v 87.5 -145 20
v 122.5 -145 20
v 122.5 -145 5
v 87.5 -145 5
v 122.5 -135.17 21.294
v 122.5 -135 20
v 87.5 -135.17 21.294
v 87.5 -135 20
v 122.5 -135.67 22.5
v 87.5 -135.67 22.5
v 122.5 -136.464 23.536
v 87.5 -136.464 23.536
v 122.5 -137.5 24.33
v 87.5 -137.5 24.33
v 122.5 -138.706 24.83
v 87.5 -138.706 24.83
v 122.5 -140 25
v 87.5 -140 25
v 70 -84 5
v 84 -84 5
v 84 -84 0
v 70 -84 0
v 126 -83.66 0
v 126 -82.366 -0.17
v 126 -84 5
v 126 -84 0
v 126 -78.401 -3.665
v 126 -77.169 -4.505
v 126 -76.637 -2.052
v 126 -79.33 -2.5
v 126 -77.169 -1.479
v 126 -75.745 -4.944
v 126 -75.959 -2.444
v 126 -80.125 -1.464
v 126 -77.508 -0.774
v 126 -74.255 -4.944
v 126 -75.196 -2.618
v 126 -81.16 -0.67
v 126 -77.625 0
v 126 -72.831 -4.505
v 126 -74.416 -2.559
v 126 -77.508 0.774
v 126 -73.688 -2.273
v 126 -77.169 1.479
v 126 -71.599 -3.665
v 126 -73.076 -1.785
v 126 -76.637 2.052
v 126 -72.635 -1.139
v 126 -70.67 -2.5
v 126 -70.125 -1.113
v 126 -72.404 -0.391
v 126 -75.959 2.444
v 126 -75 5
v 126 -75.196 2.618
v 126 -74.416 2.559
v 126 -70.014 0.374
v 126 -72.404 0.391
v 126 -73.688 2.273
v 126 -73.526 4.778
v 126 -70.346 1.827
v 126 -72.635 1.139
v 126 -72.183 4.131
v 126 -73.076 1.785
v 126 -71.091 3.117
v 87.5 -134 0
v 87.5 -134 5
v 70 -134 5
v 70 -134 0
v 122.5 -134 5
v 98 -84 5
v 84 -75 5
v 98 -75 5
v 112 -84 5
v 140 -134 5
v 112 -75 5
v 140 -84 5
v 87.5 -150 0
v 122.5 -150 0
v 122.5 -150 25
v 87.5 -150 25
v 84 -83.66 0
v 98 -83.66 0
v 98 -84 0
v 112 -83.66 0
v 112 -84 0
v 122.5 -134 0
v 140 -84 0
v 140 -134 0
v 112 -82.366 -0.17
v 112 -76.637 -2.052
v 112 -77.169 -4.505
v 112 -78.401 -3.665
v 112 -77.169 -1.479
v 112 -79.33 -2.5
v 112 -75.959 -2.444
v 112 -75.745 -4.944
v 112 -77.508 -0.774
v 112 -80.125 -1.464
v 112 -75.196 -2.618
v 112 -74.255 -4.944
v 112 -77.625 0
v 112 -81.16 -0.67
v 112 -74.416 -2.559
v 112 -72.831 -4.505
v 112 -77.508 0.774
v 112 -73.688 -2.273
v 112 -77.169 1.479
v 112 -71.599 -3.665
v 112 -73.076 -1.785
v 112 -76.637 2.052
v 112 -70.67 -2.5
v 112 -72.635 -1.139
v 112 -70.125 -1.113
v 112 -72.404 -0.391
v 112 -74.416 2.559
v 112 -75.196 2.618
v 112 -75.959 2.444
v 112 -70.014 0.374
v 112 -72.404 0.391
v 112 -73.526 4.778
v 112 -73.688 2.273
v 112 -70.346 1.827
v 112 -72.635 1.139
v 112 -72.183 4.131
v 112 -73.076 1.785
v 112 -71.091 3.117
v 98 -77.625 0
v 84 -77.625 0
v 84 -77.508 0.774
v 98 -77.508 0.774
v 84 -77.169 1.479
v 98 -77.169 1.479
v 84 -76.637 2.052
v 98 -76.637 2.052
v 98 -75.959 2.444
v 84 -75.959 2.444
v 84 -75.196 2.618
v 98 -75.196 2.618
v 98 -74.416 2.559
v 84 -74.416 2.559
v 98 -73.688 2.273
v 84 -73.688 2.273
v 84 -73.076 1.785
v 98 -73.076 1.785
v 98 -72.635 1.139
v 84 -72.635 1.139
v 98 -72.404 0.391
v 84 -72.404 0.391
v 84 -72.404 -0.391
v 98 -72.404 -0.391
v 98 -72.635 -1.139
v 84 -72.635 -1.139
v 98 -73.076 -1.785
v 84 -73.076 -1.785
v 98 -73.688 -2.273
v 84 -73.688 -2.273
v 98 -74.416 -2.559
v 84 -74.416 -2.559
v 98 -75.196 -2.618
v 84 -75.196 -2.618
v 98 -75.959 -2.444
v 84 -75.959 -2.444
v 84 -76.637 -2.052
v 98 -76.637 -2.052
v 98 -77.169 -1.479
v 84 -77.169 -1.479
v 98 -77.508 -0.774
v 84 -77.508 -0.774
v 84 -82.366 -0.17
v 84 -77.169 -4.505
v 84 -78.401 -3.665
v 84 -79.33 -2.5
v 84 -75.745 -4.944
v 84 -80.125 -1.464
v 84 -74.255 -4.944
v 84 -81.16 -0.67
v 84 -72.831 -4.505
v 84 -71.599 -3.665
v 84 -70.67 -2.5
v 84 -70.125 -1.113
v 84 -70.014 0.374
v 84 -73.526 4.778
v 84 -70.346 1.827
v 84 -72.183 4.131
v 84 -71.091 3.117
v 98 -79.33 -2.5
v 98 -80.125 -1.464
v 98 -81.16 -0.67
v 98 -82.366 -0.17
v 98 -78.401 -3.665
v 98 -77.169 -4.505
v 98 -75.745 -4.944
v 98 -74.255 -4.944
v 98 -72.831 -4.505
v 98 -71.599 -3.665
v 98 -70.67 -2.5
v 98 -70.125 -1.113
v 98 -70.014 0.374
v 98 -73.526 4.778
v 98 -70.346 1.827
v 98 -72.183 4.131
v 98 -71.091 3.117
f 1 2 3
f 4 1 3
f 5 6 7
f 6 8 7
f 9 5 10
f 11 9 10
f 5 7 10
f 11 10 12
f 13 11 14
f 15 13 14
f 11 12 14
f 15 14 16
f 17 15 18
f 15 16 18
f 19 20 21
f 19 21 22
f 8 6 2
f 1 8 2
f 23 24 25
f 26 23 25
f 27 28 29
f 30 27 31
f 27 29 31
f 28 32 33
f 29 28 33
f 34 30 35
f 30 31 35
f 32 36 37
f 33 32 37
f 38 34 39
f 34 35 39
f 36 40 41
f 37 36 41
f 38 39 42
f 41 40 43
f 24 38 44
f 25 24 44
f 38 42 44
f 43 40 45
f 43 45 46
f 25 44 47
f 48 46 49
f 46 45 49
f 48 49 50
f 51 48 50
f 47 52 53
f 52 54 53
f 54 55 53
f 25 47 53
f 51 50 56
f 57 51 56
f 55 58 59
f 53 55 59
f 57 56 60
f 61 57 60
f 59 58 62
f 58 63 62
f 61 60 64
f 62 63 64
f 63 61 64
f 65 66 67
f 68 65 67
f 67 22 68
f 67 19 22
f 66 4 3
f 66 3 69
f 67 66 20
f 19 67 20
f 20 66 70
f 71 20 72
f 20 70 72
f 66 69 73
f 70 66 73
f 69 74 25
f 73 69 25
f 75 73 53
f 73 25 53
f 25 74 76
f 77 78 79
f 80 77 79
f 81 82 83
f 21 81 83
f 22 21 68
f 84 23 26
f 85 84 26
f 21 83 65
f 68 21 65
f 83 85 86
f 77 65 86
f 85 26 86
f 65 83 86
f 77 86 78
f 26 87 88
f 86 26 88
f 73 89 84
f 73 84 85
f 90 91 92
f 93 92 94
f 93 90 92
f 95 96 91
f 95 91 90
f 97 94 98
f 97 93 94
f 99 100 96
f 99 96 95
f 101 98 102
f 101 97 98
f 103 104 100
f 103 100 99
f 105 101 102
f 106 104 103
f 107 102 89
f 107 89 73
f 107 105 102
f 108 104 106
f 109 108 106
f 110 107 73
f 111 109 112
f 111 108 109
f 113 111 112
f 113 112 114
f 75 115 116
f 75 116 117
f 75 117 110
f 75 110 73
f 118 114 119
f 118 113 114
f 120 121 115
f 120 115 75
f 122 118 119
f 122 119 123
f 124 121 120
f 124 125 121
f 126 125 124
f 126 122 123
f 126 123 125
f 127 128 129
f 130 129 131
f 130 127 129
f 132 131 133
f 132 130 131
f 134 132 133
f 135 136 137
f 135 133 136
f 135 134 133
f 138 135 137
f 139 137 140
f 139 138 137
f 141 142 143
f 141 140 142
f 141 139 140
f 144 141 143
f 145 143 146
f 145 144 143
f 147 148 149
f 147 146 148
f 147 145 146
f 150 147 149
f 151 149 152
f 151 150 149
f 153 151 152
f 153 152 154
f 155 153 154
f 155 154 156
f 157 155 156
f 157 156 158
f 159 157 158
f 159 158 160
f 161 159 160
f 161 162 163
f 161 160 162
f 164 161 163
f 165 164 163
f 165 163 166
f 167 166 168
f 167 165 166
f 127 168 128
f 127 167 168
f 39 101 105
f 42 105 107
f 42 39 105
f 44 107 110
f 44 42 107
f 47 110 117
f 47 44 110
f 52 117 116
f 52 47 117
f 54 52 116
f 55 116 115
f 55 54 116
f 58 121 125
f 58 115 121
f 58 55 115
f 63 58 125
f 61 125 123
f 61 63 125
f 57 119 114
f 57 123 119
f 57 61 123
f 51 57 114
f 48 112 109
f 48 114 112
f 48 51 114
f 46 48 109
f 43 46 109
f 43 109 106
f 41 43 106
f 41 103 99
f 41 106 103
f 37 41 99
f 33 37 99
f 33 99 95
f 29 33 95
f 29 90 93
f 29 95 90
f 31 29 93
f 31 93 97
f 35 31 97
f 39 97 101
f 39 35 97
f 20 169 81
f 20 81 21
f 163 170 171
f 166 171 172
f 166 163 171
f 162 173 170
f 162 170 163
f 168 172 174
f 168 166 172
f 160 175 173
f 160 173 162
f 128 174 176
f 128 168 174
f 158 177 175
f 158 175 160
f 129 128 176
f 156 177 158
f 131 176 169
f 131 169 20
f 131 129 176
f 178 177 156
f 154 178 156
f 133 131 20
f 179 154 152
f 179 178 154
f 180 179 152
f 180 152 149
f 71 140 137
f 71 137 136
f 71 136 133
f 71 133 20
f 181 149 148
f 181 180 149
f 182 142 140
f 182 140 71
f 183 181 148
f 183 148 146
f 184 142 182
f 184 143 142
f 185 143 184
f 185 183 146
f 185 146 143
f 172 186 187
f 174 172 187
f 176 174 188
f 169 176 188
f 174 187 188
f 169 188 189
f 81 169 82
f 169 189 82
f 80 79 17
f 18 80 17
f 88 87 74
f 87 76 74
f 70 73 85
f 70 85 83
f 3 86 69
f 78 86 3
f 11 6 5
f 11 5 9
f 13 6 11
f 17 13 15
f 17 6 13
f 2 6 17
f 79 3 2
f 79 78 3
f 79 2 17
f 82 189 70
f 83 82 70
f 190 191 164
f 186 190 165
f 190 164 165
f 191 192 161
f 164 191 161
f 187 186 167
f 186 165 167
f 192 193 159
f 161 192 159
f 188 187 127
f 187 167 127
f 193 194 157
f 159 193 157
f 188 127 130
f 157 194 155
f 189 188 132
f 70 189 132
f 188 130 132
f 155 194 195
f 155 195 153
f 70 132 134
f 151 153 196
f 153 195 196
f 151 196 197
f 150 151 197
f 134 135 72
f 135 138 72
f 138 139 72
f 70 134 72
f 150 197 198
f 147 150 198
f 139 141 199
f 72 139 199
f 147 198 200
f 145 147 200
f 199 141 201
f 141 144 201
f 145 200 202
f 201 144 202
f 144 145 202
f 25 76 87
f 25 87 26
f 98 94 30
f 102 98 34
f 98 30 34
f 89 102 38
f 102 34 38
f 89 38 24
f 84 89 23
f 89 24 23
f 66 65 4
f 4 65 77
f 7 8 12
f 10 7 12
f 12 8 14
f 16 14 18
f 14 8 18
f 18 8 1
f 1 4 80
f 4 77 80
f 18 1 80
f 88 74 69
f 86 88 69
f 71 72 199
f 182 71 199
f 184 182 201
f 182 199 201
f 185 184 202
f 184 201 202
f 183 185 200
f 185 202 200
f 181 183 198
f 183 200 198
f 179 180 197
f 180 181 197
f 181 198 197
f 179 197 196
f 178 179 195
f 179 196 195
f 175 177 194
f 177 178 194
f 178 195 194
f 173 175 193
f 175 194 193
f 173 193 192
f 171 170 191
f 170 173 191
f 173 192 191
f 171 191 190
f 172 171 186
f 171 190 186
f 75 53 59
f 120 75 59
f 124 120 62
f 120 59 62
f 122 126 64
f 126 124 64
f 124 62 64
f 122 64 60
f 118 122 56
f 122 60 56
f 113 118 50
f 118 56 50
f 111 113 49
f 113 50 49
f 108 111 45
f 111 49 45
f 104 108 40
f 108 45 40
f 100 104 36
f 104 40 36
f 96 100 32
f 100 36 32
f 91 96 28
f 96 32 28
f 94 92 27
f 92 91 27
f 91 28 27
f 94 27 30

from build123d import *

# Parameters (mm, degrees)
F0_R          = 2.625
F1_DEPTH      = 70
F2_W          = 17.5
F2_H          = 25
F3_DEPTH      = 16
F5_W          = 14
F5_H          = 10
F6_DEPTH      = 9
F6_DEPTH_BACK = 5.001
F7_R          = 4.99999
F8_ANGLE      = 180
F9_ANGLE      = 180


# Not quite as in the source:
# - a fillet or chamfer is up to 0.001 mm smaller than in the source, because OpenCascade refuses the exact size


with BuildPart() as f1:
    # F0 (on Right) → F1 (new body)
    with BuildSketch(Plane.YZ):
        with BuildLine():
            Line((-5, 5), (-20.3439258039, 5))
            Line((-20.3439258039, 5), (-75, 5))
            ThreePointArc((-75, 5), (-79.3301270189, -2.5), (-70.6698729811, -2.5))
            ThreePointArc((-70.6698729811, -2.5), (-68.8397459622, -0.6698729811), (-66.3397459622, 0))
            Line((-66.3397459622, 0), (0, 0))
            Line((0, 0), (0, 5))
            Line((0, 5), (0, 25))
            Line((0, 25), (-15, 25))
            Line((-15, 25), (-15, 20))
            Line((-15, 20), (-5, 20))
            Line((-5, 20), (-5, 5))
        make_face()
        with Locations((-75, 0)):
            Circle(F0_R, mode=Mode.SUBTRACT)
    extrude(amount=F1_DEPTH)

    # F2 (on Front) → F3 (cut)
    with BuildSketch(Plane.XZ):
        with Locations((8.75, 12.5)):
            Rectangle(F2_W, F2_H)
        with Locations((61.25, 12.5)):
            Rectangle(F2_W, F2_H)
    extrude(amount=F3_DEPTH, mode=Mode.SUBTRACT)

    # F5 (on offset) → F6 (cut, two sides)
    with BuildSketch(Plane.XZ.offset(75)) as f6_sk:
        with Locations((7, 0)):
            Rectangle(F5_W, F5_H)
        with Locations((35, 0)):
            Rectangle(F5_W, F5_H)
        with Locations((63, 0)):
            Rectangle(F5_W, F5_H)
    extrude(amount=-F6_DEPTH, mode=Mode.SUBTRACT)
    extrude(f6_sk.sketch, amount=F6_DEPTH_BACK, mode=Mode.SUBTRACT)

    # F7 (radius 5 in the source; OpenCascade refuses exactly that, so slightly less here)
    f7_edges = [f1.edges().sort_by_distance(p)[0] for p in [
        (35, -15, 25),
    ]]
    fillet(f7_edges, radius=F7_R)


with BuildPart() as f1_1:
    # F8: moved
    add(f1.part.rotate(Axis((56, -75, 0), (-1, 0, 0)), F8_ANGLE))


with BuildPart() as f1_2:
    # F9: moved
    add(f1_1.part.rotate(Axis((70, -109, 0), (0, -1, 0)), F9_ANGLE))


solid = f1_2.part
